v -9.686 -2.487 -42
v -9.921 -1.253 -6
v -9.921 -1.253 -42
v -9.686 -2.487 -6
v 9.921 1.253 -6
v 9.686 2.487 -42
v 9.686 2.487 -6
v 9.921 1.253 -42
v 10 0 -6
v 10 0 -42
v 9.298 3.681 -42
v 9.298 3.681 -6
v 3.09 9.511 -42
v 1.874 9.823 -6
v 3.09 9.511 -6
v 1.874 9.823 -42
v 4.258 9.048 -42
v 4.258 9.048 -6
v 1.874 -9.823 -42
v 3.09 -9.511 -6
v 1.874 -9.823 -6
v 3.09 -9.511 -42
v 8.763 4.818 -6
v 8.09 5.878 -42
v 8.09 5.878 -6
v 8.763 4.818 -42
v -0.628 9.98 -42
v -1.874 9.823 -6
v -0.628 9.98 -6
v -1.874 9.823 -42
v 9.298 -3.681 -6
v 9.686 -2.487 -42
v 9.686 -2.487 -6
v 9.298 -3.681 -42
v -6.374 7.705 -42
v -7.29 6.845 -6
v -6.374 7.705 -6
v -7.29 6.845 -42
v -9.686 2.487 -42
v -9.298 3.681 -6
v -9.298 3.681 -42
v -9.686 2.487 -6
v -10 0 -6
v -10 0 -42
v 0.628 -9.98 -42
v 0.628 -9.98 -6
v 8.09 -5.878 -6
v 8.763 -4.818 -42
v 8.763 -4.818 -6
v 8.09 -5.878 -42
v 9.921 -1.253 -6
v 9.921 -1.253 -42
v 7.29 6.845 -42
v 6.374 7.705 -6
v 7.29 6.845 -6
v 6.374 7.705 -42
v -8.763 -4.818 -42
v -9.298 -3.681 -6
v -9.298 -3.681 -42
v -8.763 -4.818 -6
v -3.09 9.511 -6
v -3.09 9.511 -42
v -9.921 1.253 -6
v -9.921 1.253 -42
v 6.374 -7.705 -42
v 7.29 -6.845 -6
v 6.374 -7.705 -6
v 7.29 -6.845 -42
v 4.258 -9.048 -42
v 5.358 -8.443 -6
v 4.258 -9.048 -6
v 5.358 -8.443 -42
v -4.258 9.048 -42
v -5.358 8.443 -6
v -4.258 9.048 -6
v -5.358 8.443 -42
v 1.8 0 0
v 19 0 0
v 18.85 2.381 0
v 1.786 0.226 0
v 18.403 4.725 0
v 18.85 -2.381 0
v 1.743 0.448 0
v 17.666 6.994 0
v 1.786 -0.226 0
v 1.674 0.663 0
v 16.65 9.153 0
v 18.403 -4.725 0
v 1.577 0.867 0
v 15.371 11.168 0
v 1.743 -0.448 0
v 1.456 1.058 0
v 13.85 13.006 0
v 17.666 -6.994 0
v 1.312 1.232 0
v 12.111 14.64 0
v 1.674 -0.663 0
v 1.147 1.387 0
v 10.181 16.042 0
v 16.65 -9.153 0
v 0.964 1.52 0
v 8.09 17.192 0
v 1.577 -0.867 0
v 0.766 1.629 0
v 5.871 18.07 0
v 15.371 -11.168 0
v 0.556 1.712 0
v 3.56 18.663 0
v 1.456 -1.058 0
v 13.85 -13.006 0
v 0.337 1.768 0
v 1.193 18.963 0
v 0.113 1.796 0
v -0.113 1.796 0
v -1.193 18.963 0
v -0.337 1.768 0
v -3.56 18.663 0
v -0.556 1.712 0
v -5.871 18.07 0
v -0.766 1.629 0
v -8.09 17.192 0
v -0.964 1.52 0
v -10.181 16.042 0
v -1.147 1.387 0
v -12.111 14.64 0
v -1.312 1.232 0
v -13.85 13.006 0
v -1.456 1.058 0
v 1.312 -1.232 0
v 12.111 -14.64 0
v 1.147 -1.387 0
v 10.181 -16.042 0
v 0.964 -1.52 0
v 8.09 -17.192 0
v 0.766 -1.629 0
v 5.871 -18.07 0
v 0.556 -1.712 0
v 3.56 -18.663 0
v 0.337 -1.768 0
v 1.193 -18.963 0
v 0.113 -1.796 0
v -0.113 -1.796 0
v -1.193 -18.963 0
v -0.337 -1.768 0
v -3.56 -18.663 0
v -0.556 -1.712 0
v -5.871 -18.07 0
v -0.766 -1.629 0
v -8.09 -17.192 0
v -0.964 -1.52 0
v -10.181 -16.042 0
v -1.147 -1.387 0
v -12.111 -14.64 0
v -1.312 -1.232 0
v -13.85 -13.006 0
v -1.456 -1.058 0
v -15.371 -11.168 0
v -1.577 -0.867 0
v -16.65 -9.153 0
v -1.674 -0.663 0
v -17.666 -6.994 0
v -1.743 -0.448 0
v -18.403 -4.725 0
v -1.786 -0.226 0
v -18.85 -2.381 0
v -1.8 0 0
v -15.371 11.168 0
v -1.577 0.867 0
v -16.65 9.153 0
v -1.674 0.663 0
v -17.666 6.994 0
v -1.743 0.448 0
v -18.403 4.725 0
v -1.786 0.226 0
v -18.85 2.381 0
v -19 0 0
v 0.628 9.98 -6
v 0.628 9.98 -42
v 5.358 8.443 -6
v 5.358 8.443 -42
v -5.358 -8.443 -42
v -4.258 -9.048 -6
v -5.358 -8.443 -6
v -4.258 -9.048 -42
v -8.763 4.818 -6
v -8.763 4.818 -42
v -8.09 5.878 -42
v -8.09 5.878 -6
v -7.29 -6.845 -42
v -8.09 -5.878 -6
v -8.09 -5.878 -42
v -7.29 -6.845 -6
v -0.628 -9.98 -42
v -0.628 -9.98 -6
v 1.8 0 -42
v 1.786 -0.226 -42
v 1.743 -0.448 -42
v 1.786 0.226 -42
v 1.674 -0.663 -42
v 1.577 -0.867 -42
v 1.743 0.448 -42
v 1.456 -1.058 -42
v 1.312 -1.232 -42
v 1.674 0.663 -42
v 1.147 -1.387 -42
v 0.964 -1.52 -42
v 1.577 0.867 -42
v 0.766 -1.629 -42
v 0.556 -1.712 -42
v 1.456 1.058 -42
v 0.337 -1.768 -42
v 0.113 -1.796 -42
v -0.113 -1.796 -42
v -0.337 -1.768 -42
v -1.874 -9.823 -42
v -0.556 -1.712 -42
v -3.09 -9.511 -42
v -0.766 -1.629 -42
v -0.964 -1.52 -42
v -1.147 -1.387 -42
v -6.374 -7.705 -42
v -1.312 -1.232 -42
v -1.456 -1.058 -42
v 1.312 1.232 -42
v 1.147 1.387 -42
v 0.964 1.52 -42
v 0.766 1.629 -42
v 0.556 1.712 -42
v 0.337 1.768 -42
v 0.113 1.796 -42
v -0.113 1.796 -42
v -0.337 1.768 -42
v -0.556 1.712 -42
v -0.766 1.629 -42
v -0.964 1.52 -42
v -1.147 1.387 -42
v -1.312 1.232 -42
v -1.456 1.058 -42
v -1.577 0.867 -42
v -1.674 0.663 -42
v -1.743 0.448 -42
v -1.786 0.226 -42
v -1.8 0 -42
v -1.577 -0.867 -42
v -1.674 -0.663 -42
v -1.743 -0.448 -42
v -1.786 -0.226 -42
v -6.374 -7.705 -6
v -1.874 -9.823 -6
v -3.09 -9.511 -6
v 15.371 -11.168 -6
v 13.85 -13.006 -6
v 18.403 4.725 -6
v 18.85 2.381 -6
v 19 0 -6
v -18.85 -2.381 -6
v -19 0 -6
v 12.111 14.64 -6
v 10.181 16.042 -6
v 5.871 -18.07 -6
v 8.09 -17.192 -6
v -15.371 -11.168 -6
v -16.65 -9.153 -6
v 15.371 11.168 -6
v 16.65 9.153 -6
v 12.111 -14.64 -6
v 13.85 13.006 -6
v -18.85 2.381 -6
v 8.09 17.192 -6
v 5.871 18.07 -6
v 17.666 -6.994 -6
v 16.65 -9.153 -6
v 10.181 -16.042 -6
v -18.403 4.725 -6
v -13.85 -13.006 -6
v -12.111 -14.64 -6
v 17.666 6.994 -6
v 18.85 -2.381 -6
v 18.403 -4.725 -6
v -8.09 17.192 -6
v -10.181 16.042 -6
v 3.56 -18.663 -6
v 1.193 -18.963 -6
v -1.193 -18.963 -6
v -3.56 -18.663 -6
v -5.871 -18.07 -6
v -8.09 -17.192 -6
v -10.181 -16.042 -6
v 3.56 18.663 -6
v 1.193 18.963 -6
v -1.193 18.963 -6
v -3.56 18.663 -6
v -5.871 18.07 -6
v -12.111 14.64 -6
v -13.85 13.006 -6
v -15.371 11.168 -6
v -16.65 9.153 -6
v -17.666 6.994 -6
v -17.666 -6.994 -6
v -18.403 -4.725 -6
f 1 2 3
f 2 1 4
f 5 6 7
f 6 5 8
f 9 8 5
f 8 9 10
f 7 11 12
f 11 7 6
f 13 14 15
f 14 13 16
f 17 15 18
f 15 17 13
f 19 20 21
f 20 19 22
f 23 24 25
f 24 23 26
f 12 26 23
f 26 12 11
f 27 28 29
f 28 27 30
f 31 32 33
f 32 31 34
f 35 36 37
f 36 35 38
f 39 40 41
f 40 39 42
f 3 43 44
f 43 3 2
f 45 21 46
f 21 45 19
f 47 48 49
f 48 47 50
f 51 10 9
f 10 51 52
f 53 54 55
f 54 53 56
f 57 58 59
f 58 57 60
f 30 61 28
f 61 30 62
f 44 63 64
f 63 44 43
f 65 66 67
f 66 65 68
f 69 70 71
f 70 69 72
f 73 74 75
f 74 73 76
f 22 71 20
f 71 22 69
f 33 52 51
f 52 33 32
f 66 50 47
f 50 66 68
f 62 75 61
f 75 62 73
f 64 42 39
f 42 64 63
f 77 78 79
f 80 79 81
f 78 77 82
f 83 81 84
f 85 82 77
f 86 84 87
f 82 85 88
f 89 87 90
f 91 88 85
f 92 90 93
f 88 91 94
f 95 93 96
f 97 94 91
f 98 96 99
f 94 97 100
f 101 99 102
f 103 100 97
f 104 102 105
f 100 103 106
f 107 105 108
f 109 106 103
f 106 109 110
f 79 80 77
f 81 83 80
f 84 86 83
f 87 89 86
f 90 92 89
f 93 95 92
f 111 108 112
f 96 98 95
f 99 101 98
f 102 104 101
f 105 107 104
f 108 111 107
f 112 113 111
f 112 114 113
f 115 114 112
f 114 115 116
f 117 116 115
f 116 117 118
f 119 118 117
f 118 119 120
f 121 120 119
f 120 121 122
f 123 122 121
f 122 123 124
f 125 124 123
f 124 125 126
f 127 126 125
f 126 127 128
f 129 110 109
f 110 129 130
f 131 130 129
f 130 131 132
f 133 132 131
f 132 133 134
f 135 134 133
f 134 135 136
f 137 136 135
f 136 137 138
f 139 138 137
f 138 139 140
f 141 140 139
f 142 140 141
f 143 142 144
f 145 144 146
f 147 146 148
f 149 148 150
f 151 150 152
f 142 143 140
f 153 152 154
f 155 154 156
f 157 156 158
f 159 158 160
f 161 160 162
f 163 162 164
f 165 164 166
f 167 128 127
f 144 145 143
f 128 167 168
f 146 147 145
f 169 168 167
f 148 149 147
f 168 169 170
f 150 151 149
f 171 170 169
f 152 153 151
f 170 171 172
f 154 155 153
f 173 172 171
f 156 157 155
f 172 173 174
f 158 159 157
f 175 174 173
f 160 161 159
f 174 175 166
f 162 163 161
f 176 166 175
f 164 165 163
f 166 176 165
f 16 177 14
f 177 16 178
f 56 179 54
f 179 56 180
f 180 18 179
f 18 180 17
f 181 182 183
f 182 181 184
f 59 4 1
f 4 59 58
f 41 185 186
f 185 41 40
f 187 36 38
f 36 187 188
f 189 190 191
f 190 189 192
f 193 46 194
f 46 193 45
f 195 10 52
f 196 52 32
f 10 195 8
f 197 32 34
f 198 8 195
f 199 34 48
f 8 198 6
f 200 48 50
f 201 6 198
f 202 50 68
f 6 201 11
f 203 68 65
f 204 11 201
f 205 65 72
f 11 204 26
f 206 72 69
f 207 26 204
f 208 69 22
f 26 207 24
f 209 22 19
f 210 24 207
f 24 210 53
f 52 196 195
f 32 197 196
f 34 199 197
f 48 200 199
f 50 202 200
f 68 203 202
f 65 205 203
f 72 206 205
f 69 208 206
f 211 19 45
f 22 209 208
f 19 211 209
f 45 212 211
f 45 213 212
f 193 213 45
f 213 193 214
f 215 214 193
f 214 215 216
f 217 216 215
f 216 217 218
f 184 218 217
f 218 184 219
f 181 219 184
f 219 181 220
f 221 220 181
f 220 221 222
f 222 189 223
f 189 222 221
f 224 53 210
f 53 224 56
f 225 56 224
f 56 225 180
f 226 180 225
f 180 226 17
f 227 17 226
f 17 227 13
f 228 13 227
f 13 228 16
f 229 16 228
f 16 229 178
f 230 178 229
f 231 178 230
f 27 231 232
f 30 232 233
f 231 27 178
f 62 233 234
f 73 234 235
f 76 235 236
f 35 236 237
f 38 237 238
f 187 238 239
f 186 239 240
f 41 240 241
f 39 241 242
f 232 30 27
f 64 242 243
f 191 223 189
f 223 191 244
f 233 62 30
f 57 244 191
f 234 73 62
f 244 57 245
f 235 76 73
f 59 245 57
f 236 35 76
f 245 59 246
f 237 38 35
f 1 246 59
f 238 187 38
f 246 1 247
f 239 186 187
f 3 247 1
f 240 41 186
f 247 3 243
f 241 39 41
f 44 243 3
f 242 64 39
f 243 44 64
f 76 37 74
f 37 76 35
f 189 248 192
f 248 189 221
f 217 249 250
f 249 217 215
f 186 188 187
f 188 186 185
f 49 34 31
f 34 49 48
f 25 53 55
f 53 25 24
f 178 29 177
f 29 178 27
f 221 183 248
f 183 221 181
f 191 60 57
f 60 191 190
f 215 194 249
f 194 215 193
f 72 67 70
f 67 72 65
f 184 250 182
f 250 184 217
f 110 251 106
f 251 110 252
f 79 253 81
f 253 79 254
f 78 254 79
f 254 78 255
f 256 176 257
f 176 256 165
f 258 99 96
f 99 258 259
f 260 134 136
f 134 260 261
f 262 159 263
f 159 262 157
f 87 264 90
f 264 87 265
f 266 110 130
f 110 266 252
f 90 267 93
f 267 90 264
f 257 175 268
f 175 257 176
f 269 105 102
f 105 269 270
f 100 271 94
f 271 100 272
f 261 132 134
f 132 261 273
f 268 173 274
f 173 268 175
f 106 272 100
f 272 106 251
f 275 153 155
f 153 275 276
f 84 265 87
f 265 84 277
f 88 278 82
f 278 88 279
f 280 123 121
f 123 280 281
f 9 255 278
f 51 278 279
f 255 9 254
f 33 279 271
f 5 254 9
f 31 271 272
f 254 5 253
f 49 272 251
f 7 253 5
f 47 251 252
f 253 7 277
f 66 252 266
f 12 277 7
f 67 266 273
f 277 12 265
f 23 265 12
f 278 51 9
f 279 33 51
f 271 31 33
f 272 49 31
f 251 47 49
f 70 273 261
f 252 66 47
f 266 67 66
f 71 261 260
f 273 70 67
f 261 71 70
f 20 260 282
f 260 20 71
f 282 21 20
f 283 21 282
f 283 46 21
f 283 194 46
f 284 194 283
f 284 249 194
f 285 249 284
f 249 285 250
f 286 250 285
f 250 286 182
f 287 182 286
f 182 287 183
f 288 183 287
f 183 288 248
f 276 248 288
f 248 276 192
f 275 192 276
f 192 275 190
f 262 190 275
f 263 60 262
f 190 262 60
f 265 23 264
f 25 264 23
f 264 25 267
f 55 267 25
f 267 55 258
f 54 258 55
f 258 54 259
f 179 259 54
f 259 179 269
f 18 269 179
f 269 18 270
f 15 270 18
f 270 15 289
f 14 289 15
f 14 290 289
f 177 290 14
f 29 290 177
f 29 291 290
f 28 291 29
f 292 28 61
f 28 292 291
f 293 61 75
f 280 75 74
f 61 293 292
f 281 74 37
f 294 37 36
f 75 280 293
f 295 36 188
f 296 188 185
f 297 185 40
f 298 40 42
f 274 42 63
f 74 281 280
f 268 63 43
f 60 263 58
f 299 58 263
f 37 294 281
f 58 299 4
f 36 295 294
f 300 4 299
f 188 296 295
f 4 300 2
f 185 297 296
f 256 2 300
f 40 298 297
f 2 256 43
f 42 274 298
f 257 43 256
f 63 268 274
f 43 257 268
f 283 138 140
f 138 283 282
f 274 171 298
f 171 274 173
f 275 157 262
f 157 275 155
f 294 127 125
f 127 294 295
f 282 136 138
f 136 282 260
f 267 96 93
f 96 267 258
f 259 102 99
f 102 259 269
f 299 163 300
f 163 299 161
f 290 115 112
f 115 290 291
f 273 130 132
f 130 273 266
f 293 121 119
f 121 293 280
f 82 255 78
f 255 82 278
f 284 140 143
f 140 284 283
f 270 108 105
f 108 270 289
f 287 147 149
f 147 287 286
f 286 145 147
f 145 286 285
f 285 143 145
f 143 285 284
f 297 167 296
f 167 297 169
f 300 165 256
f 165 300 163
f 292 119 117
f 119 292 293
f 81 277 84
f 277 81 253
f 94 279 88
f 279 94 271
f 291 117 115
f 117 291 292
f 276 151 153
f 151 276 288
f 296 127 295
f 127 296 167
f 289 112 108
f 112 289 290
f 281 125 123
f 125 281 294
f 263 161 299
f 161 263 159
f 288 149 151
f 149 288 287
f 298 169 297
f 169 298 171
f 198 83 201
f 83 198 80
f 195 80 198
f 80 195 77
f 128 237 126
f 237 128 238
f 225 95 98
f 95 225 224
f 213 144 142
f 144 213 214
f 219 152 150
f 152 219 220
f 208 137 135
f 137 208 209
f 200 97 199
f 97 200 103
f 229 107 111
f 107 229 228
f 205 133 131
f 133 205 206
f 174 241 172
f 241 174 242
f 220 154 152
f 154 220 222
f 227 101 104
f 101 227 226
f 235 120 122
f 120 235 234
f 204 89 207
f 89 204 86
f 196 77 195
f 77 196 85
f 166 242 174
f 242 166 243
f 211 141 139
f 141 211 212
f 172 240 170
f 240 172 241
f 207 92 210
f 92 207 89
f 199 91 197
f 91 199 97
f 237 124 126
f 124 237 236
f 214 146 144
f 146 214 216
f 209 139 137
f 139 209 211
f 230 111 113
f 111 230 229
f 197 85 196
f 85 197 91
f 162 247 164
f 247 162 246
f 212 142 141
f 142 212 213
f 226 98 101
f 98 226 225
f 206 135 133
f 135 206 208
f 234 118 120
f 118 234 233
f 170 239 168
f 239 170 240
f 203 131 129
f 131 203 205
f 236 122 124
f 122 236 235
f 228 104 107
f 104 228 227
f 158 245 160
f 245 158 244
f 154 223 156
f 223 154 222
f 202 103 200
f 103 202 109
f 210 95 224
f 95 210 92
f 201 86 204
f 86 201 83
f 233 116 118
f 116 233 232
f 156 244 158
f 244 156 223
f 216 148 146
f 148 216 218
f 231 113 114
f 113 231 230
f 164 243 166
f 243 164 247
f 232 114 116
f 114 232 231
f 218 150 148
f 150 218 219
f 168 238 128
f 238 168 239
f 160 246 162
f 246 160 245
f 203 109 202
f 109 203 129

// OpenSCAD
$fn = 50;


difference() {
	union() {
		translate(v = [0, 0, -42.0000000000]) {
			cylinder(h = 42, r = 10.0000000000);
		}
		translate(v = [0, 0, -6.0000000000]) {
			cylinder(h = 6, r = 19.0000000000);
		}
	}
	union() {
		#translate(v = [0, 0, -42]) {
			cylinder(h = 42, r = 1.8000000000);
		}
	}
}
